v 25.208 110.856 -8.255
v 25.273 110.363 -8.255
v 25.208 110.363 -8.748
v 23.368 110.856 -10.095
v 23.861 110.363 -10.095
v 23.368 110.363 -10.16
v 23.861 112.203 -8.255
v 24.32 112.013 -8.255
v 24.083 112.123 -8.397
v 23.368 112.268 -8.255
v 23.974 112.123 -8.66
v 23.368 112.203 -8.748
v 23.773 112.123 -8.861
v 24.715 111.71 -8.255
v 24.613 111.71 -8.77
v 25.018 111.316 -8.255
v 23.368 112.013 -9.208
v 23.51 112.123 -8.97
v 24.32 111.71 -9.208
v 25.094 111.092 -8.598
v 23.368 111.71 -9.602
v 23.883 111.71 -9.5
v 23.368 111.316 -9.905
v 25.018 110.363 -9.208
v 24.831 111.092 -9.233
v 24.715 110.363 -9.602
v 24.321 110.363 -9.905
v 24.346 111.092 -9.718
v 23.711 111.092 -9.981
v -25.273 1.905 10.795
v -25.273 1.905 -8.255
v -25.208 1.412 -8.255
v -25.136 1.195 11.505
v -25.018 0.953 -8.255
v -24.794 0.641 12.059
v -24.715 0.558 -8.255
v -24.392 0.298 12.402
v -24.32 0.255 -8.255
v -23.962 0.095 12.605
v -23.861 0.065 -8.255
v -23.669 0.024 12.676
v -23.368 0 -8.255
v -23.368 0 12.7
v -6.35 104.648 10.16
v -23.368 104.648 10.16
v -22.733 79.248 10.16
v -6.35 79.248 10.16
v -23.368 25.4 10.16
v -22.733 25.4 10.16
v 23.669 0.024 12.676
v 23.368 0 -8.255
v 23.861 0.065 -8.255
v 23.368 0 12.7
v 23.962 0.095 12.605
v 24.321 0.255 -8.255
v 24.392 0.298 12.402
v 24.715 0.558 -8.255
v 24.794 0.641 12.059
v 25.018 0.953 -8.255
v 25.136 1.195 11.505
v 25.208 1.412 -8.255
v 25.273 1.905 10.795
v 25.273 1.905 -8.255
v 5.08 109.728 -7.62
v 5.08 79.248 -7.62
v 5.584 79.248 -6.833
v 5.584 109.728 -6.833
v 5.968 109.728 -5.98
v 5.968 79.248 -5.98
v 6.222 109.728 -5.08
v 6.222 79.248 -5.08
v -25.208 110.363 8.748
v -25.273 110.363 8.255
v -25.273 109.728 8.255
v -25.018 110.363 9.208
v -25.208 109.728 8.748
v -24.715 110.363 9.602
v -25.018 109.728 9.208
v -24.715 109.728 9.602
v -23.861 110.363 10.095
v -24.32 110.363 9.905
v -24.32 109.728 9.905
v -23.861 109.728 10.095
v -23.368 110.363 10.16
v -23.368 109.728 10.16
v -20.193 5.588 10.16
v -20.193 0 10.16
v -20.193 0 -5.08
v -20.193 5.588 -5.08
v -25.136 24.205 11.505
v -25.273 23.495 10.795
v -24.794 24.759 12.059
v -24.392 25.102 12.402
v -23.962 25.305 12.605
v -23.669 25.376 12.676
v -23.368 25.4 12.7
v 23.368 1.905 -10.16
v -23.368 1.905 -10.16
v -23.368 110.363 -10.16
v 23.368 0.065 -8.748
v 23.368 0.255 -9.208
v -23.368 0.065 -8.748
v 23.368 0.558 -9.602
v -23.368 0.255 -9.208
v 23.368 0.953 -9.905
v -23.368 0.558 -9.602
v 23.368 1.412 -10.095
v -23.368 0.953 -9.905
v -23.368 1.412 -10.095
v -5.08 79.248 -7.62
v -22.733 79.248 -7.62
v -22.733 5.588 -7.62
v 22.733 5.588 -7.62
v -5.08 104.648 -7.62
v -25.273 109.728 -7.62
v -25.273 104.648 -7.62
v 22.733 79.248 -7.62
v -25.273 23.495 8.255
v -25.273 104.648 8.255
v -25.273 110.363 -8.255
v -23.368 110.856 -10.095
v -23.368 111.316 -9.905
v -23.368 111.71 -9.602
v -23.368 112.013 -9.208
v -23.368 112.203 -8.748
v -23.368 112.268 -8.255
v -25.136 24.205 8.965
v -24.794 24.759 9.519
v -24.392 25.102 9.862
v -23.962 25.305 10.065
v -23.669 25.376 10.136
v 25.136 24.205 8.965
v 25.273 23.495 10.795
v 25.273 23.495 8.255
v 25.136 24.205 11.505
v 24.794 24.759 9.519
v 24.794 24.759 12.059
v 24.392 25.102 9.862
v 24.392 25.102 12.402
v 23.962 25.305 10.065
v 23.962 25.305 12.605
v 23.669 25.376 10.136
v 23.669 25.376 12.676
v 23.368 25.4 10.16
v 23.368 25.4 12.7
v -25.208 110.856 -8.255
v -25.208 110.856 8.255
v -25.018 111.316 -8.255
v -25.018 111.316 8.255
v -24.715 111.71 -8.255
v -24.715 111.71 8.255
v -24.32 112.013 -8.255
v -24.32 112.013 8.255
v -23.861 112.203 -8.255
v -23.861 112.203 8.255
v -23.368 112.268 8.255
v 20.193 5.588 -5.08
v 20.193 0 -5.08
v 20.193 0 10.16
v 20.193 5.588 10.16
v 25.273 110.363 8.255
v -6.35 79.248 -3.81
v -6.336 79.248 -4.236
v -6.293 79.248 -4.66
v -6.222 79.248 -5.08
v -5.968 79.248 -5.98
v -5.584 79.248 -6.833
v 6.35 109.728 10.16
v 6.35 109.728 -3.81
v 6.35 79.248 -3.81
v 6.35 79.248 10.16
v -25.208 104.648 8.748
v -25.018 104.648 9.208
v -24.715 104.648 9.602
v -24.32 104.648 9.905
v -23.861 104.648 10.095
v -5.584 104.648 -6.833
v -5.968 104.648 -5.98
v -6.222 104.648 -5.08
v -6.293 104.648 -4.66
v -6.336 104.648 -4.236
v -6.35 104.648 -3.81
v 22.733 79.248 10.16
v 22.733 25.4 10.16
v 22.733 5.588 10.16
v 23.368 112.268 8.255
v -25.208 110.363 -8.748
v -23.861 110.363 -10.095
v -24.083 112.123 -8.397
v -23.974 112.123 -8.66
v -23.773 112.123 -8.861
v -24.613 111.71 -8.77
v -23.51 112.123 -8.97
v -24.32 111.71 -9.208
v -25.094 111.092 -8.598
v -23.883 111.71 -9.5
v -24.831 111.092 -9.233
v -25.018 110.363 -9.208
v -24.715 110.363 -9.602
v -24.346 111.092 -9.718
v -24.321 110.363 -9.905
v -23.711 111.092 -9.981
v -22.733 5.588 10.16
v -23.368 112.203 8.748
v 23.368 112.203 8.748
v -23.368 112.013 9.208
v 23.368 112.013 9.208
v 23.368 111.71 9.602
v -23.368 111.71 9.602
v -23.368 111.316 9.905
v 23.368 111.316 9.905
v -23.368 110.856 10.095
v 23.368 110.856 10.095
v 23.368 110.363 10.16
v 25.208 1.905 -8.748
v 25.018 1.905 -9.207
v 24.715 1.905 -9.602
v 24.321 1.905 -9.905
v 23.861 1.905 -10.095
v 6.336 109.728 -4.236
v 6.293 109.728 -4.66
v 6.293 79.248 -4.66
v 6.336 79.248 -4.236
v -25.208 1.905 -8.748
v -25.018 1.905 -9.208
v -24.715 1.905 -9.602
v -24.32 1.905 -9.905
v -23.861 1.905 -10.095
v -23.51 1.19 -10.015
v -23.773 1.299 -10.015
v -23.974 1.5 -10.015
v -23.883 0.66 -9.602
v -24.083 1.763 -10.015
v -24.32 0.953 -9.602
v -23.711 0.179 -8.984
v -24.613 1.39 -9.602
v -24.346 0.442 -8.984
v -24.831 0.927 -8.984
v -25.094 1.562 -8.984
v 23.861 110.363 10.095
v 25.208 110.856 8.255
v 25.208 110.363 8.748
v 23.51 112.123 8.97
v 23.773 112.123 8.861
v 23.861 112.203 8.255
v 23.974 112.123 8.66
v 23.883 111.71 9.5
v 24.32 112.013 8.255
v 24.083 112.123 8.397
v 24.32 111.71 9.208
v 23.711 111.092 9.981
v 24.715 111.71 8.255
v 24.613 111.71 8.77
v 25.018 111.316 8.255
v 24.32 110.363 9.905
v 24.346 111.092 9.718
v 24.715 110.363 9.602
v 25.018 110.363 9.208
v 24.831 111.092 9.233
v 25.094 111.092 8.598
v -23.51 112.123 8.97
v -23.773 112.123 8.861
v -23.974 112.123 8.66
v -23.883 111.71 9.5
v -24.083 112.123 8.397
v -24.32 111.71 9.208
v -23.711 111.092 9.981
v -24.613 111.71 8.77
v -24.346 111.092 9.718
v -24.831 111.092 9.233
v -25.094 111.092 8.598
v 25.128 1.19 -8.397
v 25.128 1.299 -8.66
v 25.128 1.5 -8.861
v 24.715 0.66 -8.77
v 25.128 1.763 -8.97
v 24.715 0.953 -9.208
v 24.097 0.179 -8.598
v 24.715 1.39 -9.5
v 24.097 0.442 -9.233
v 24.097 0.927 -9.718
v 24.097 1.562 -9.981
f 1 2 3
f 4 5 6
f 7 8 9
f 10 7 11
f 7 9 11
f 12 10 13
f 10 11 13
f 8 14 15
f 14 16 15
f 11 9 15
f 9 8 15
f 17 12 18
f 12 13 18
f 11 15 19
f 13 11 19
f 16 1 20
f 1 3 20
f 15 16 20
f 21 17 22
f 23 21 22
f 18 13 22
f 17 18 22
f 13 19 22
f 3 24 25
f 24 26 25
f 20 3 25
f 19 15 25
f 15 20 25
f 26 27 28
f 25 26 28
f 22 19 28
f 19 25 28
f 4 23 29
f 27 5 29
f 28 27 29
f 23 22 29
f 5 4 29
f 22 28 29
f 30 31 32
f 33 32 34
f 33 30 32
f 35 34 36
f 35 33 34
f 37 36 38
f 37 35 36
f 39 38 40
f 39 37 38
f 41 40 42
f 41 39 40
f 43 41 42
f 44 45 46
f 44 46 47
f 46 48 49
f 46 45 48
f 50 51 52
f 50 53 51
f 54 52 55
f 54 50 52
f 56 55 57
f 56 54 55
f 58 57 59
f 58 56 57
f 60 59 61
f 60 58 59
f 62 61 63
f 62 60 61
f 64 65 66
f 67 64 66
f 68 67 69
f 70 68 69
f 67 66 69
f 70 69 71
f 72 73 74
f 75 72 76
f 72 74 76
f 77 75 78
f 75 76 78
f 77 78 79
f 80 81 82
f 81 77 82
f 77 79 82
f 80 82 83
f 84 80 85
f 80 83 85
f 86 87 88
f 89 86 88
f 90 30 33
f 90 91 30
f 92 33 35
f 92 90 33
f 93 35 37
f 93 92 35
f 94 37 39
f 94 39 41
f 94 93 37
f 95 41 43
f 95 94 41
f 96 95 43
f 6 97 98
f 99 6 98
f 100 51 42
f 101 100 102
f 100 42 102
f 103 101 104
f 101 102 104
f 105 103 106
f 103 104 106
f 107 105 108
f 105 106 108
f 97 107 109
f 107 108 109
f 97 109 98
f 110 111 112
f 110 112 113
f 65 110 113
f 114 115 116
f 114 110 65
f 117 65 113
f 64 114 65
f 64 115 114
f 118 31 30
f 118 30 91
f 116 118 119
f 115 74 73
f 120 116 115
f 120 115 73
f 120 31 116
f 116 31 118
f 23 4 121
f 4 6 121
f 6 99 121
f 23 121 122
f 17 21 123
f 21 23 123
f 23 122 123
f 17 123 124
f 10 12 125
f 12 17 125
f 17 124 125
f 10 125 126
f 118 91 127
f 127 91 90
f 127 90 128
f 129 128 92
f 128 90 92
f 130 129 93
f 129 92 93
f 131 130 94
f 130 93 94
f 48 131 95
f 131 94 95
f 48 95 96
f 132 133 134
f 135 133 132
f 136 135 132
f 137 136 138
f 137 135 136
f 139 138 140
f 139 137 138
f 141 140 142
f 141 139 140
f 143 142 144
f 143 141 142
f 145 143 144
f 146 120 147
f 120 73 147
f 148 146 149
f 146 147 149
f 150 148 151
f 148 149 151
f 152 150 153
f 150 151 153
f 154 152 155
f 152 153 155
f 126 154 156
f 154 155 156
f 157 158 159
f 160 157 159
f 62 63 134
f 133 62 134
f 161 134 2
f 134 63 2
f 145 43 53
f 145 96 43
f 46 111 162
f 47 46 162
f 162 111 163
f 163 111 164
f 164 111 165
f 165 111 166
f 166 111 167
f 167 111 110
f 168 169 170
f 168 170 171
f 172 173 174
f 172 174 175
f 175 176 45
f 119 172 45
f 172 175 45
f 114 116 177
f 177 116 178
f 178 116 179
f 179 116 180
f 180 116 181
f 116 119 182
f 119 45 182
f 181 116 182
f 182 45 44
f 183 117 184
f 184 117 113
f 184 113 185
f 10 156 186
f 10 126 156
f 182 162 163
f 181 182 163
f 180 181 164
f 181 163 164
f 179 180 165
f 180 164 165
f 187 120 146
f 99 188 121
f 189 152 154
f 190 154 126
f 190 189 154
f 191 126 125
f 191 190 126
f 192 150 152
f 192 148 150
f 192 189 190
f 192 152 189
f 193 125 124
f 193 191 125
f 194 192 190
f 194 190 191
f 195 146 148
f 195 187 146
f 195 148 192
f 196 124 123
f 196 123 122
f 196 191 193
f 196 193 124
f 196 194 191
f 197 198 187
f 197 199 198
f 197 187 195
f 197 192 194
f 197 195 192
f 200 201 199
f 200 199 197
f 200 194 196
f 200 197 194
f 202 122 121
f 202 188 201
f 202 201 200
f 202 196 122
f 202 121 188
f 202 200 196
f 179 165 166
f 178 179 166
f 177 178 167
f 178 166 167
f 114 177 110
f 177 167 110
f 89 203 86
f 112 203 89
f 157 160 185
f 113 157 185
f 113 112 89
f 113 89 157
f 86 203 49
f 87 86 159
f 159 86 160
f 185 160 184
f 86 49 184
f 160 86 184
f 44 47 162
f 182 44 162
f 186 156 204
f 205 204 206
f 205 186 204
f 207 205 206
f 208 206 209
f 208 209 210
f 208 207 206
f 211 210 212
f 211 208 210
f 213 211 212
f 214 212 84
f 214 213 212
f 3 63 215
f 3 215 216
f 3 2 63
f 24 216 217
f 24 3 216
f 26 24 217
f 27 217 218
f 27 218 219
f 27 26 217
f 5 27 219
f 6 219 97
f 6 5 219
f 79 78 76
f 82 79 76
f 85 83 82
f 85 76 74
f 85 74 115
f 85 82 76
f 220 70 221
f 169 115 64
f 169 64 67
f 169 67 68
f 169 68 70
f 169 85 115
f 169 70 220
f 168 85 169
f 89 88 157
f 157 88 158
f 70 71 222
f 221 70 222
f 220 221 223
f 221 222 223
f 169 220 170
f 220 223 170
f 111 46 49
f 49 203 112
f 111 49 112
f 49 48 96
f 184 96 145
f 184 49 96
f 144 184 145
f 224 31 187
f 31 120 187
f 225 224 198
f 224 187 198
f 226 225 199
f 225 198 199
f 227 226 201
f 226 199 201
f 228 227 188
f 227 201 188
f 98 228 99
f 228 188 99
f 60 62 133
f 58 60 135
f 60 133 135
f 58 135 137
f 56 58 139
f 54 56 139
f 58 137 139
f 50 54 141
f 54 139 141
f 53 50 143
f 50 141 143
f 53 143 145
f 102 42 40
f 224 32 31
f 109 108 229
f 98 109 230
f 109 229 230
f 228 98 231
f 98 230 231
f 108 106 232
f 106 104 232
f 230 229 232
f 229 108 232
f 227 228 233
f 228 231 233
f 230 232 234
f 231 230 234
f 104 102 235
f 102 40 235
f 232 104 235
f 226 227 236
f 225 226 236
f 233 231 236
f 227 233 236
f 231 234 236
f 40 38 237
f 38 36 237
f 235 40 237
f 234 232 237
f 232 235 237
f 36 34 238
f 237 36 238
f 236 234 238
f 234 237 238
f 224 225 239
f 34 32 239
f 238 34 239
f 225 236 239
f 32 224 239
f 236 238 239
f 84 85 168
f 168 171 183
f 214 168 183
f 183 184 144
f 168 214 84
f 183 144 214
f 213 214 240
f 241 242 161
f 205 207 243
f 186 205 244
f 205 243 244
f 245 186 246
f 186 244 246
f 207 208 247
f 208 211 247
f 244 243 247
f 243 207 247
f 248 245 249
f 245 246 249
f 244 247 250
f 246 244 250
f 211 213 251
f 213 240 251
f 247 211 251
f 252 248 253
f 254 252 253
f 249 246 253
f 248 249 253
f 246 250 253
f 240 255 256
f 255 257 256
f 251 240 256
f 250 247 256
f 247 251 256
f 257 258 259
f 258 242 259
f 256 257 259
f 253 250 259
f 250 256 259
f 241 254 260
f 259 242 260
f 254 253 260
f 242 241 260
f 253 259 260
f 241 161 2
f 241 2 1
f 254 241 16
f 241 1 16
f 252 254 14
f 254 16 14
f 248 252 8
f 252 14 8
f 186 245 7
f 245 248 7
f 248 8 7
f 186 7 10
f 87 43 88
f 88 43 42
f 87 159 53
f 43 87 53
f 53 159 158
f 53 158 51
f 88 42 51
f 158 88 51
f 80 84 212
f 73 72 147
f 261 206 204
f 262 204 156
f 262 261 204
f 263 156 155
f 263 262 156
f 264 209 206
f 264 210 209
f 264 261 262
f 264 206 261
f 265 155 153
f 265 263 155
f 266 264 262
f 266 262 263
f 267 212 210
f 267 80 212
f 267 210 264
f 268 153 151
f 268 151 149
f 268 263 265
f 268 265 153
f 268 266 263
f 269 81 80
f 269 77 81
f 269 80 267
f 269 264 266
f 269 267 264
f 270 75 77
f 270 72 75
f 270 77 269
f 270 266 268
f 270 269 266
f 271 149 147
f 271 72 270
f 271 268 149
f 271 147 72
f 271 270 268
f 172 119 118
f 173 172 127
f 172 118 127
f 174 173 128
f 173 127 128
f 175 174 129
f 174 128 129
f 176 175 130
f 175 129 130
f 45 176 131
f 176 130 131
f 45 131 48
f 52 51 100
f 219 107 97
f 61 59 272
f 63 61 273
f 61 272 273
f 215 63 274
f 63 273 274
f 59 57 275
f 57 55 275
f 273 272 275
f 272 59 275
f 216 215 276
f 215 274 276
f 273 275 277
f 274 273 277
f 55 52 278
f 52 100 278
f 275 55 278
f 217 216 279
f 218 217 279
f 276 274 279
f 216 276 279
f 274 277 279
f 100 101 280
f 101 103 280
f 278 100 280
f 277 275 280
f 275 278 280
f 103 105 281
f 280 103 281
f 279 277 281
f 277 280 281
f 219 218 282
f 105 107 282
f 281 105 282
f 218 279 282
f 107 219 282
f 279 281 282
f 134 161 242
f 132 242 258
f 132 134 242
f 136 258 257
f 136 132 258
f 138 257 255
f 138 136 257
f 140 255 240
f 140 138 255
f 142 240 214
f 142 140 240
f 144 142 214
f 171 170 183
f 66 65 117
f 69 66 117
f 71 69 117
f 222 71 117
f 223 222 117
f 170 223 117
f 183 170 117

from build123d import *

# Parameters (mm, degrees)
SKETCH1_W            = 2.54
SKETCH1_H            = 2.54
BOSS_EXTRUDE3_DEPTH  = 5.588
BOSS_EXTRUDE4_START  = 5.588
BOSS_EXTRUDE4_DEPTH  = 73.66
BOSS_EXTRUDE6_START  = 79.248
SKETCH1_8_W          = 2.54
SKETCH1_8_H          = 2.54
SKETCH1_8_W_2        = 13.843
BOSS_EXTRUDE6_DEPTH  = 30.48
BOSS_EXTRUDE7_START  = 109.728
SKETCH1_9_W          = 12.7
SKETCH1_9_H          = 2.54
SKETCH1_9_W_2        = 2.54
SKETCH1_9_W_3        = 13.843
BOSS_EXTRUDE7_DEPTH  = 2.54
SKETCH4_W            = 50.546
SKETCH4_H            = 25.4
BOSS_EXTRUDE10_DEPTH = 2.54
FILLET1_R            = 1.905
SKETCH3_W            = 20.193
SKETCH3_H            = 5.08
CUT_EXTRUDE3_DEPTH   = 17.78


with BuildPart() as part:
    # Sketch1 → Boss-Extrude3 (new body)
    with BuildSketch(Plane(origin=(0, 0, 0), x_dir=(1, 0, 0), z_dir=(0, 1, 0))):
        with BuildLine():
            Line((-22.733, -10.16), (-22.733, -7.62))
            Line((-22.733, -7.62), (-22.733, 7.62))
            Line((-22.733, 7.62), (-5.08, 7.62))
            ThreePointArc((-5.08, 7.62), (-2.839806331, 9.489612663), (0, 10.16))
            Line((0, 10.16), (-25.273, 10.16))
            Line((-25.273, 10.16), (-25.273, -10.16))
            Line((-25.273, -10.16), (-22.733, -10.16))
        make_face()
        with BuildLine():
            ThreePointArc((0, 10.16), (2.839806331, 9.489612663), (5.08, 7.62))
            Line((5.08, 7.62), (22.733, 7.62))
            Line((22.733, 7.62), (22.733, -7.62))
            Line((22.733, -7.62), (22.733, -10.16))
            Line((22.733, -10.16), (25.273, -10.16))
            Line((25.273, -10.16), (25.273, 10.16))
            Line((25.273, 10.16), (0, 10.16))
        make_face()
        with BuildLine():
            ThreePointArc((0, 10.16), (-2.839806331, 9.489612663), (-5.08, 7.62))
            Line((-5.08, 7.62), (5.08, 7.62))
            ThreePointArc((5.08, 7.62), (2.839806331, 9.489612663), (0, 10.16))
        make_face()
        with BuildLine():
            Line((-22.733, 7.62), (-22.733, -7.62))
            Line((-22.733, -7.62), (-20.193, -7.62))
            Line((-20.193, -7.62), (-20.193, -5.08))
            Line((-20.193, -5.08), (-20.193, 5.08))
            Line((-20.193, 5.08), (-6.221703947, 5.08))
            ThreePointArc((-6.221703947, 5.08), (-5.791806974, 6.413357827), (-5.08, 7.62))
            Line((-5.08, 7.62), (-22.733, 7.62))
        make_face()
        with Locations((-21.463, -8.89)):
            Rectangle(SKETCH1_W, SKETCH1_H)
        with BuildLine():
            Line((5.08, 7.62), (-5.08, 7.62))
            ThreePointArc((-5.08, 7.62), (-5.791806974, 6.413357827), (-6.221703947, 5.08))
            Line((-6.221703947, 5.08), (6.221703947, 5.08))
            ThreePointArc((6.221703947, 5.08), (5.791806974, 6.413357827), (5.08, 7.62))
        make_face()
        with BuildLine():
            Line((22.733, 7.62), (5.08, 7.62))
            ThreePointArc((5.08, 7.62), (5.791806974, 6.413357827), (6.221703947, 5.08))
            Line((6.221703947, 5.08), (20.193, 5.08))
            Line((20.193, 5.08), (20.193, -5.08))
            Line((20.193, -5.08), (20.193, -7.62))
            Line((20.193, -7.62), (22.733, -7.62))
            Line((22.733, -7.62), (22.733, 7.62))
        make_face()
        with Locations((21.463, -8.89)):
            Rectangle(SKETCH1_W, SKETCH1_H)
    extrude(amount=BOSS_EXTRUDE3_DEPTH)

    # Sketch1<7> → Boss-Extrude4 (add)
    with BuildSketch(Plane(origin=(0, 0, 0), x_dir=(1, 0, 0), z_dir=(0, 1, 0)).offset(BOSS_EXTRUDE4_START)):
        with BuildLine():
            Line((-22.733, -10.16), (-22.733, -7.62))
            Line((-22.733, -7.62), (-22.733, 7.62))
            Line((-22.733, 7.62), (-5.08, 7.62))
            ThreePointArc((-5.08, 7.62), (-2.839806331, 9.489612663), (0, 10.16))
            Line((0, 10.16), (-25.273, 10.16))
            Line((-25.273, 10.16), (-25.273, -10.16))
            Line((-25.273, -10.16), (-22.733, -10.16))
        make_face()
        with BuildLine():
            ThreePointArc((0, 10.16), (2.839806331, 9.489612663), (5.08, 7.62))
            Line((5.08, 7.62), (22.733, 7.62))
            Line((22.733, 7.62), (22.733, -7.62))
            Line((22.733, -7.62), (22.733, -10.16))
            Line((22.733, -10.16), (25.273, -10.16))
            Line((25.273, -10.16), (25.273, 10.16))
            Line((25.273, 10.16), (0, 10.16))
        make_face()
        with BuildLine():
            ThreePointArc((0, 10.16), (-2.839806331, 9.489612663), (-5.08, 7.62))
            Line((-5.08, 7.62), (5.08, 7.62))
            ThreePointArc((5.08, 7.62), (2.839806331, 9.489612663), (0, 10.16))
        make_face()
    extrude(amount=BOSS_EXTRUDE4_DEPTH)

    # Sketch1<8> → Boss-Extrude6 (add)
    with BuildSketch(Plane(origin=(0, 0, 0), x_dir=(1, 0, 0), z_dir=(0, 1, 0)).offset(BOSS_EXTRUDE6_START)):
        with BuildLine():
            Line((-22.733, -10.16), (-22.733, -7.62))
            Line((-22.733, -7.62), (-22.733, 7.62))
            Line((-22.733, 7.62), (-5.08, 7.62))
            ThreePointArc((-5.08, 7.62), (-2.839806331, 9.489612663), (0, 10.16))
            Line((0, 10.16), (-25.273, 10.16))
            Line((-25.273, 10.16), (-25.273, -10.16))
            Line((-25.273, -10.16), (-22.733, -10.16))
        make_face()
        with BuildLine():
            Line((-22.733, 7.62), (-22.733, -7.62))
            Line((-22.733, -7.62), (-20.193, -7.62))
            Line((-20.193, -7.62), (-20.193, -5.08))
            Line((-20.193, -5.08), (-20.193, 5.08))
            Line((-20.193, 5.08), (-6.221703947, 5.08))
            ThreePointArc((-6.221703947, 5.08), (-5.791806974, 6.413357827), (-5.08, 7.62))
            Line((-5.08, 7.62), (-22.733, 7.62))
        make_face()
        with BuildLine():
            Line((-20.193, -5.08), (-20.193, -7.62))
            Line((-20.193, -7.62), (-6.35, -7.62))
            Line((-6.35, -7.62), (-6.35, -3.175))
            Line((-6.35, -3.175), (-6.35, 3.81))
            ThreePointArc((-6.35, 3.81), (-6.317844572, 4.448231909), (-6.221703947, 5.08))
            Line((-6.221703947, 5.08), (-20.193, 5.08))
            Line((-20.193, 5.08), (-20.193, -5.08))
        make_face()
        with Locations((-21.463, -8.89)):
            Rectangle(SKETCH1_8_W, SKETCH1_8_H)
        with Locations((-13.2715, -8.89)):
            Rectangle(SKETCH1_8_W_2, SKETCH1_8_H)
        with BuildLine():
            ThreePointArc((0, 10.16), (2.839806331, 9.489612663), (5.08, 7.62))
            Line((5.08, 7.62), (22.733, 7.62))
            Line((22.733, 7.62), (22.733, -7.62))
            Line((22.733, -7.62), (22.733, -10.16))
            Line((22.733, -10.16), (25.273, -10.16))
            Line((25.273, -10.16), (25.273, 10.16))
            Line((25.273, 10.16), (0, 10.16))
        make_face()
        with BuildLine():
            Line((22.733, 7.62), (5.08, 7.62))
            ThreePointArc((5.08, 7.62), (5.791806974, 6.413357827), (6.221703947, 5.08))
            Line((6.221703947, 5.08), (20.193, 5.08))
            Line((20.193, 5.08), (20.193, -5.08))
            Line((20.193, -5.08), (20.193, -7.62))
            Line((20.193, -7.62), (22.733, -7.62))
            Line((22.733, -7.62), (22.733, 7.62))
        make_face()
        with BuildLine():
            Line((6.35, -3.175), (6.35, -7.62))
            Line((6.35, -7.62), (20.193, -7.62))
            Line((20.193, -7.62), (20.193, -5.08))
            Line((20.193, -5.08), (20.193, 5.08))
            Line((20.193, 5.08), (6.221703947, 5.08))
            ThreePointArc((6.221703947, 5.08), (6.317844572, 4.448231909), (6.35, 3.81))
            Line((6.35, 3.81), (6.35, -3.175))
        make_face()
        with Locations((13.2715, -8.89)):
            Rectangle(SKETCH1_8_W_2, SKETCH1_8_H)
        with Locations((21.463, -8.89)):
            Rectangle(SKETCH1_8_W, SKETCH1_8_H)
        with BuildLine():
            ThreePointArc((0, 10.16), (-2.839806331, 9.489612663), (-5.08, 7.62))
            Line((-5.08, 7.62), (5.08, 7.62))
            ThreePointArc((5.08, 7.62), (2.839806331, 9.489612663), (0, 10.16))
        make_face()
    extrude(amount=BOSS_EXTRUDE6_DEPTH)

    # Sketch1<9> → Boss-Extrude7 (add)
    with BuildSketch(Plane(origin=(0, 0, 0), x_dir=(1, 0, 0), z_dir=(0, 1, 0)).offset(BOSS_EXTRUDE7_START)):
        with BuildLine():
            Line((-6.35, -3.175), (-6.35, -7.62))
            Line((-6.35, -7.62), (6.35, -7.62))
            Line((6.35, -7.62), (6.35, -3.175))
            Line((6.35, -3.175), (6.35, 3.81))
            ThreePointArc((6.35, 3.81), (6.317844572, 4.448231909), (6.221703947, 5.08))
            Line((6.221703947, 5.08), (-6.221703947, 5.08))
            ThreePointArc((-6.221703947, 5.08), (-6.317844572, 4.448231909), (-6.35, 3.81))
            Line((-6.35, 3.81), (-6.35, -3.175))
        make_face()
        with Locations((0, -8.89)):
            Rectangle(SKETCH1_9_W, SKETCH1_9_H)
        with BuildLine():
            Line((5.08, 7.62), (-5.08, 7.62))
            ThreePointArc((-5.08, 7.62), (-5.791806974, 6.413357827), (-6.221703947, 5.08))
            Line((-6.221703947, 5.08), (6.221703947, 5.08))
            ThreePointArc((6.221703947, 5.08), (5.791806974, 6.413357827), (5.08, 7.62))
        make_face()
        with BuildLine():
            Line((-22.733, -10.16), (-22.733, -7.62))
            Line((-22.733, -7.62), (-22.733, 7.62))
            Line((-22.733, 7.62), (-5.08, 7.62))
            ThreePointArc((-5.08, 7.62), (-2.839806331, 9.489612663), (0, 10.16))
            Line((0, 10.16), (-25.273, 10.16))
            Line((-25.273, 10.16), (-25.273, -10.16))
            Line((-25.273, -10.16), (-22.733, -10.16))
        make_face()
        with Locations((-21.463, -8.89)):
            Rectangle(SKETCH1_9_W_2, SKETCH1_9_H)
        with BuildLine():
            Line((-22.733, 7.62), (-22.733, -7.62))
            Line((-22.733, -7.62), (-20.193, -7.62))
            Line((-20.193, -7.62), (-20.193, -5.08))
            Line((-20.193, -5.08), (-20.193, 5.08))
            Line((-20.193, 5.08), (-6.221703947, 5.08))
            ThreePointArc((-6.221703947, 5.08), (-5.791806974, 6.413357827), (-5.08, 7.62))
            Line((-5.08, 7.62), (-22.733, 7.62))
        make_face()
        with Locations((-13.2715, -8.89)):
            Rectangle(SKETCH1_9_W_3, SKETCH1_9_H)
        with BuildLine():
            Line((-20.193, -5.08), (-20.193, -7.62))
            Line((-20.193, -7.62), (-6.35, -7.62))
            Line((-6.35, -7.62), (-6.35, -3.175))
            Line((-6.35, -3.175), (-6.35, 3.81))
            ThreePointArc((-6.35, 3.81), (-6.317844572, 4.448231909), (-6.221703947, 5.08))
            Line((-6.221703947, 5.08), (-20.193, 5.08))
            Line((-20.193, 5.08), (-20.193, -5.08))
        make_face()
        with BuildLine():
            ThreePointArc((0, 10.16), (-2.839806331, 9.489612663), (-5.08, 7.62))
            Line((-5.08, 7.62), (5.08, 7.62))
            ThreePointArc((5.08, 7.62), (2.839806331, 9.489612663), (0, 10.16))
        make_face()
        with BuildLine():
            Line((22.733, 7.62), (5.08, 7.62))
            ThreePointArc((5.08, 7.62), (5.791806974, 6.413357827), (6.221703947, 5.08))
            Line((6.221703947, 5.08), (20.193, 5.08))
            Line((20.193, 5.08), (20.193, -5.08))
            Line((20.193, -5.08), (20.193, -7.62))
            Line((20.193, -7.62), (22.733, -7.62))
            Line((22.733, -7.62), (22.733, 7.62))
        make_face()
        with BuildLine():
            ThreePointArc((0, 10.16), (2.839806331, 9.489612663), (5.08, 7.62))
            Line((5.08, 7.62), (22.733, 7.62))
            Line((22.733, 7.62), (22.733, -7.62))
            Line((22.733, -7.62), (22.733, -10.16))
            Line((22.733, -10.16), (25.273, -10.16))
            Line((25.273, -10.16), (25.273, 10.16))
            Line((25.273, 10.16), (0, 10.16))
        make_face()
        with BuildLine():
            Line((6.35, -3.175), (6.35, -7.62))
            Line((6.35, -7.62), (20.193, -7.62))
            Line((20.193, -7.62), (20.193, -5.08))
            Line((20.193, -5.08), (20.193, 5.08))
            Line((20.193, 5.08), (6.221703947, 5.08))
            ThreePointArc((6.221703947, 5.08), (6.317844572, 4.448231909), (6.35, 3.81))
            Line((6.35, 3.81), (6.35, -3.175))
        make_face()
        with Locations((13.2715, -8.89)):
            Rectangle(SKETCH1_9_W_3, SKETCH1_9_H)
        with Locations((21.463, -8.89)):
            Rectangle(SKETCH1_9_W_2, SKETCH1_9_H)
    extrude(amount=BOSS_EXTRUDE7_DEPTH)

    # Sketch4 → Boss-Extrude10 (add)
    with BuildSketch(Plane.XY.offset(10.16)):
        with Locations((0, 12.7)):
            Rectangle(SKETCH4_W, SKETCH4_H)
    extrude(amount=BOSS_EXTRUDE10_DEPTH)

    # Fillet1
    fillet1_edges = [part.edges().sort_by_distance(p)[0] for p in [
        (-25.273, 25.4, 11.43),
        (25.273, 25.4, 11.43),
        (-25.273, 12.7, 12.7),
        (25.273, 12.7, 12.7),
        (-25.273, 0, 1.27),
        (0, 0, -10.16),
        (25.273, 0, 1.27),
        (-25.273, 68.834, 10.16),
        (-25.273, 56.134, -10.16),
        (25.273, 56.134, -10.16),
        (25.273, 68.834, 10.16),
        (0, 112.268, 10.16),
        (25.273, 112.268, 0),
        (-25.273, 112.268, 0),
        (0, 112.268, -10.16),
    ]]
    fillet(fillet1_edges, radius=FILLET1_R)

    # Sketch3 → Cut-Extrude3 (cut)
    with BuildSketch(Plane.XY.offset(10.16)):
        with Locations((-15.1765, 107.188)):
            Rectangle(SKETCH3_W, SKETCH3_H)
    extrude(amount=-CUT_EXTRUDE3_DEPTH, mode=Mode.SUBTRACT)


solid = part.part
